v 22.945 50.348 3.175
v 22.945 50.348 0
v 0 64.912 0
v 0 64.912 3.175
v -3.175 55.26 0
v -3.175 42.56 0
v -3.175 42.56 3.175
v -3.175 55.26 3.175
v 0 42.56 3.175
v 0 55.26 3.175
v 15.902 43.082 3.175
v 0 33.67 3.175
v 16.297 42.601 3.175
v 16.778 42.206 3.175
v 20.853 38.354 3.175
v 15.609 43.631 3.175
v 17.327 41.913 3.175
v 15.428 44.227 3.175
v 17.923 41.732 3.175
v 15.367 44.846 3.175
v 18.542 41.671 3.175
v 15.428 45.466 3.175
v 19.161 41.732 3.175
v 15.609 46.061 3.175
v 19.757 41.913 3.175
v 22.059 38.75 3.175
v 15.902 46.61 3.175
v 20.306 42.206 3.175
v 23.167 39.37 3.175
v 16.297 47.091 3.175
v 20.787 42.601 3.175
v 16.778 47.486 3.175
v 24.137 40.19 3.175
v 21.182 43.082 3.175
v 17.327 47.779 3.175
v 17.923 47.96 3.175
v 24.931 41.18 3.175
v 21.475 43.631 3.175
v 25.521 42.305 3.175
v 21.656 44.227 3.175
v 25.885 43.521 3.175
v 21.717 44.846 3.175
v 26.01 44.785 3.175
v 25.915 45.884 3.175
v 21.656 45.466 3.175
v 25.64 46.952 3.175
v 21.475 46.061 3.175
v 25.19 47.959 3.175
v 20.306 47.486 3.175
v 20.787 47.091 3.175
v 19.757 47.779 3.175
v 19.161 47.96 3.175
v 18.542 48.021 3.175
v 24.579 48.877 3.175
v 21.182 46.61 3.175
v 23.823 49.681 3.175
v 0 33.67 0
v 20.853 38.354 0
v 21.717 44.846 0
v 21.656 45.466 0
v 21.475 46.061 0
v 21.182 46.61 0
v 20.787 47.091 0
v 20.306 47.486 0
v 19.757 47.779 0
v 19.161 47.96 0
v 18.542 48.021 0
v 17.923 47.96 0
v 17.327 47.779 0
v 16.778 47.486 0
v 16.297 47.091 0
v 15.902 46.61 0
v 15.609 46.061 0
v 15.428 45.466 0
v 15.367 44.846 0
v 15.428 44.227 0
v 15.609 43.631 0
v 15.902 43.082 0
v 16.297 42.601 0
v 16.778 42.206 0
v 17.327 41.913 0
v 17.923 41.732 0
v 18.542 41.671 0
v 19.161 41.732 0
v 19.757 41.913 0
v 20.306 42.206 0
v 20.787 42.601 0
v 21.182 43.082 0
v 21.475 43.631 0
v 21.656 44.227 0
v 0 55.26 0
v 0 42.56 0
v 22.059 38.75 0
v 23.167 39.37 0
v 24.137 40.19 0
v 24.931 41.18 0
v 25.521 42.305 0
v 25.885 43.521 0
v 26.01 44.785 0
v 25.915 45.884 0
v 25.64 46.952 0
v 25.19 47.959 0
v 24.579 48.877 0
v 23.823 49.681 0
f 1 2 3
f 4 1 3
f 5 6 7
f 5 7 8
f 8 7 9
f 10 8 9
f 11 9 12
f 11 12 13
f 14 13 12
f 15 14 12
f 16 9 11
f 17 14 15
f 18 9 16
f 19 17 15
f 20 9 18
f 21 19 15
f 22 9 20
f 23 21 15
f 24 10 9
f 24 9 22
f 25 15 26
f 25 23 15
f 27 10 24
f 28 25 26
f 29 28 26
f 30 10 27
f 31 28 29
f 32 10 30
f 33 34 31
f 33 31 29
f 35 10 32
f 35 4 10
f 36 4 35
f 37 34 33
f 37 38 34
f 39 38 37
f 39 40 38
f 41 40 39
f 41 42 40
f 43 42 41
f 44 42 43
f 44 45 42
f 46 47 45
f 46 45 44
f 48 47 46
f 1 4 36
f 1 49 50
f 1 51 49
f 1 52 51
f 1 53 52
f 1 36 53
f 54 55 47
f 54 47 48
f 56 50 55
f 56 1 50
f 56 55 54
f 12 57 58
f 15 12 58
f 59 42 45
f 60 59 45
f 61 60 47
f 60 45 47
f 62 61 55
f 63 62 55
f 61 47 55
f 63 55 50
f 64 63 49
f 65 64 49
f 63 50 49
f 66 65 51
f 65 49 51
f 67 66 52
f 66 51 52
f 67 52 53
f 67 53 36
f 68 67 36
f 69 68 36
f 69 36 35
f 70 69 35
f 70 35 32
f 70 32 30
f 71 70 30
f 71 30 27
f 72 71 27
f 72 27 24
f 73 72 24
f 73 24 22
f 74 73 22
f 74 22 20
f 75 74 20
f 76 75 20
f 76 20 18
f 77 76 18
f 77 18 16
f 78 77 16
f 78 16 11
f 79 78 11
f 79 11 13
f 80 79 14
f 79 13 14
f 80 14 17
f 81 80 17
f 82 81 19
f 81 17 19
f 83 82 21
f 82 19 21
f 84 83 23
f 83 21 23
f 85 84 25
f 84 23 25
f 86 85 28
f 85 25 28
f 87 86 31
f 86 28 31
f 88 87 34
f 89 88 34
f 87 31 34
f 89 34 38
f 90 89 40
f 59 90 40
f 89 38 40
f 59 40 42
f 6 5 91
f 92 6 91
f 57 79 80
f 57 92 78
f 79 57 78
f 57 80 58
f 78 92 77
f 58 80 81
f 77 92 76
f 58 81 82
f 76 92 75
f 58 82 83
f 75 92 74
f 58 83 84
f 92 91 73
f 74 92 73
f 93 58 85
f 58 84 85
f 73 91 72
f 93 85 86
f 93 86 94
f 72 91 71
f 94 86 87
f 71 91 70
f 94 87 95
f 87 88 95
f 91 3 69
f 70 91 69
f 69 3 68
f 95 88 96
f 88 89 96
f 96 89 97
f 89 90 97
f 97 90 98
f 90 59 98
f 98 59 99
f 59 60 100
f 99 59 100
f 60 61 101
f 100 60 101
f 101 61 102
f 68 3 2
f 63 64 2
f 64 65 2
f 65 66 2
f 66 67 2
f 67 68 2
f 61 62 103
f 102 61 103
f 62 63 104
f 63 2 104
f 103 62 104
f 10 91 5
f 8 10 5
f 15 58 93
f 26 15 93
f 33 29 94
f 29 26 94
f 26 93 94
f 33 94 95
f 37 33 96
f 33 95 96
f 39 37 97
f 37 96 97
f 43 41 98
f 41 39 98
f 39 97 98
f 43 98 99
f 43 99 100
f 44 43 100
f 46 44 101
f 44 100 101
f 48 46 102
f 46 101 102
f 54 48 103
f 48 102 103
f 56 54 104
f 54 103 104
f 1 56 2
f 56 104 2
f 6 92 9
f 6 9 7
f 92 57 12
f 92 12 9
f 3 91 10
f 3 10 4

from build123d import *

# Parameters (mm, degrees)
SKETCH1_W                   = 68.548183611
SKETCH1_H                   = 64.912098736
BOSS_EXTRUDE1_DEPTH         = 3.175
F_1_4_0_25_DIAMETER_HOLE1_D = 6.35
CUT_EXTRUDE1_DEPTH          = 95.459063428
FILLET1_R                   = 6.604
SKETCH5_W                   = 3.175
SKETCH5_H                   = 12.7
BOSS_EXTRUDE2_DEPTH         = 3.175


with BuildPart() as part:
    # Sketch1 → Boss-Extrude1 (new body)
    with BuildSketch(Plane.XY):
        with Locations((34.274091805, 32.456049368)):
            Rectangle(SKETCH1_W, SKETCH1_H)
    extrude(amount=BOSS_EXTRUDE1_DEPTH)

    # 1/4 (0.25) Diameter Hole1 (through all)
    with Locations(Plane(origin=(0, 0, 0), x_dir=(-1, 0, 0), z_dir=(0, 0, -1))):
        with Locations((-18.542, 44.846098736)):
            Hole(F_1_4_0_25_DIAMETER_HOLE1_D / 2)

    # Sketch4 → Cut-Extrude1 (cut, through all)
    with BuildSketch(Plane(origin=(0, 0, 0), x_dir=(-1, 0, 0), z_dir=(0, 0, -1))):
        Polygon((-26.0096, 48.402098736), (0, 64.912098736), (-68.548183611, 64.912098736), (-68.548183611, 0), (0, 0), (0, 33.670098736), (-26.0096, 39.512098736), align=None)
    extrude(amount=-CUT_EXTRUDE1_DEPTH, mode=Mode.SUBTRACT)

    # Fillet1
    # the kernel refuses this fillet: 6.604 mm, written as the material it takes off along each edge
    with BuildSketch(Plane(origin=(26.0096, 48.402098736, -9.075328034), x_dir=(-0.84427202966114, 0.5359148625778718, 0), z_dir=(0, 0, 1))) as fillet1_piece_1:
        with BuildLine():
            CenterArc((FILLET1_R * 0.549686737352, FILLET1_R), FILLET1_R, 212.405976432, 57.594023568)
            Line((-FILLET1_R * 0.294585292309, FILLET1_R * 0.464085137422), (0, 0))
            Line((0, 0), (FILLET1_R * 0.549686737352, 0))
        make_face()
    extrude(amount=21.325656067, mode=Mode.SUBTRACT)
    with BuildSketch(Plane(origin=(26.0096, 39.512098736, -13.213034706), x_dir=(-0.9756913106586464, -0.21914941547997013, 0), z_dir=(0, 0, 1))) as fillet1_piece_2:
        with BuildLine():
            CenterArc((FILLET1_R * 0.800304948901, -FILLET1_R), FILLET1_R, 90, 77.340921003)
            Line((-FILLET1_R * 0.175386361757, -FILLET1_R * 0.78085058452), (0, 0))
            Line((0, 0), (FILLET1_R * 0.800304948901, 0))
        make_face()
    extrude(amount=29.601069413, mode=Mode.SUBTRACT)

    # Sketch5 → Boss-Extrude2 (add)
    with BuildSketch(Plane(origin=(0, 0, 0), x_dir=(-1, 0, 0), z_dir=(0, 0, -1))):
        with Locations((1.5875, 48.910098736)):
            Rectangle(SKETCH5_W, SKETCH5_H)
    extrude(amount=-BOSS_EXTRUDE2_DEPTH)


solid = part.part
